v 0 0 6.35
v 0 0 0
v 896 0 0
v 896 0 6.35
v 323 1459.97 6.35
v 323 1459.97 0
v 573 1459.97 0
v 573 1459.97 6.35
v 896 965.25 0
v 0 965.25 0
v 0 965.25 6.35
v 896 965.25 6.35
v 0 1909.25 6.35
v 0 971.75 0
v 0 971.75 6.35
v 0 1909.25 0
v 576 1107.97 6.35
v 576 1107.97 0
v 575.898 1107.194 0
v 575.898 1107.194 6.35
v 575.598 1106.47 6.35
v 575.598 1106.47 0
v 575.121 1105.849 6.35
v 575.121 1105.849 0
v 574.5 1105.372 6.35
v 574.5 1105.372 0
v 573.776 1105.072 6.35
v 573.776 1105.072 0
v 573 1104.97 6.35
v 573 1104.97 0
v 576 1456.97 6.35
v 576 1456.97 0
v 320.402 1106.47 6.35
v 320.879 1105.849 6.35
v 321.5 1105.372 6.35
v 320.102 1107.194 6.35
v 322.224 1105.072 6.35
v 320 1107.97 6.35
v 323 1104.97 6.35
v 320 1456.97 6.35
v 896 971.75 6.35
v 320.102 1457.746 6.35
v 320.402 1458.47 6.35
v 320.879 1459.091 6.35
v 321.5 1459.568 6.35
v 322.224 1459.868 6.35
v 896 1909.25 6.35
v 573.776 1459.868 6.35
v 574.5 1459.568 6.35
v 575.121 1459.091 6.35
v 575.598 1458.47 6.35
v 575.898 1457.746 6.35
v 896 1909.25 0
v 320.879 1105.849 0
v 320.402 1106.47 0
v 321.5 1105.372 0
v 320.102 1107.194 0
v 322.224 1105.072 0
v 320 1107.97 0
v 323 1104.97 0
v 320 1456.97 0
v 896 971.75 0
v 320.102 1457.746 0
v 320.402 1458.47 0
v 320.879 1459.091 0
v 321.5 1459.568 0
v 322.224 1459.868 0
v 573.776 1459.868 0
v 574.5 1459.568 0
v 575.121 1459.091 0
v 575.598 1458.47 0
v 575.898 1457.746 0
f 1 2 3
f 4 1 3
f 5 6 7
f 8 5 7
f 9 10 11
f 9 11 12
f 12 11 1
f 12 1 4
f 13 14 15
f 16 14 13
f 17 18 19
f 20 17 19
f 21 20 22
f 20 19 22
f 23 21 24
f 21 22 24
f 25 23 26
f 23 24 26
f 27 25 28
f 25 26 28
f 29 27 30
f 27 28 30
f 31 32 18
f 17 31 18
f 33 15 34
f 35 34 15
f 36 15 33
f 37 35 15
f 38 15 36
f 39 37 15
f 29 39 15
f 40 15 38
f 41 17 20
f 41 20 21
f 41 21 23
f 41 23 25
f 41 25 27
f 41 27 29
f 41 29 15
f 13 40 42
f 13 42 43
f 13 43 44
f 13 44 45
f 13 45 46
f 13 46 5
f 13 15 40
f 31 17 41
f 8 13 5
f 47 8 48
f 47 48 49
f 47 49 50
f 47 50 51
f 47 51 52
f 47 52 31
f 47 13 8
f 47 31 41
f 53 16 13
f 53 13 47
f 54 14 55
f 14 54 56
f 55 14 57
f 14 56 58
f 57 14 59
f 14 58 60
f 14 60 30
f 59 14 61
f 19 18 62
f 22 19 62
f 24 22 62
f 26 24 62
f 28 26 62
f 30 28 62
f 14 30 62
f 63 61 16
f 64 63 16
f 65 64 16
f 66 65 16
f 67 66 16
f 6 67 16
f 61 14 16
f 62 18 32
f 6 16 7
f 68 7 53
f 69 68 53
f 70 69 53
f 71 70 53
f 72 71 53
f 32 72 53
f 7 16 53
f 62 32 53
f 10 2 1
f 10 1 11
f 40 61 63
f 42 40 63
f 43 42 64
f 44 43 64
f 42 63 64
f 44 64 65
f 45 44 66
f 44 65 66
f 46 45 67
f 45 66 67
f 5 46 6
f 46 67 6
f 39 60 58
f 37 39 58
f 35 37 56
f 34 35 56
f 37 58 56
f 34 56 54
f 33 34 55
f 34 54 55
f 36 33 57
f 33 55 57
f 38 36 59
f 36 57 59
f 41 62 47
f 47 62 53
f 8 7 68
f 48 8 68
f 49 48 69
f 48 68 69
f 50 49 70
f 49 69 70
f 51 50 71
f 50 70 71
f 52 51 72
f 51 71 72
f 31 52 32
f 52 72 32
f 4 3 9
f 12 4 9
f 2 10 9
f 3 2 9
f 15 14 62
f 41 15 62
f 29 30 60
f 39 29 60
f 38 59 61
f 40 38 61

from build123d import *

# Parameters (mm, degrees)
F0_W     = 896
F0_H     = 965.25
F1_DEPTH = 6.35
F0_H_2   = 937.5
F2_DEPTH = 6.35


with BuildPart() as f1:
    # F0 (on Top) → F1 (new body)
    with BuildSketch(Plane.XY):
        with Locations((448, 482.625)):
            Rectangle(F0_W, F0_H)
    extrude(amount=F1_DEPTH)


with BuildPart() as f2:
    # F0 (on Top) → F2 (new body)
    with BuildSketch(Plane.XY):
        with Locations((448, 1440.5)):
            Rectangle(F0_W, F0_H_2)
        with BuildLine():
            Line((573, 1104.97), (323, 1104.97))
            ThreePointArc((323, 1104.97), (320.87868, 1105.84868), (320, 1107.97))
            Line((320, 1107.97), (320, 1456.97))
            ThreePointArc((320, 1456.97), (320.87868, 1459.09132), (323, 1459.97))
            Line((323, 1459.97), (573, 1459.97))
            ThreePointArc((573, 1459.97), (575.12132, 1459.09132), (576, 1456.97))
            Line((576, 1456.97), (576, 1107.97))
            ThreePointArc((576, 1107.97), (575.12132, 1105.84868), (573, 1104.97))
        make_face(mode=Mode.SUBTRACT)
    extrude(amount=F2_DEPTH)


solid = Compound([f1.part, f2.part])
